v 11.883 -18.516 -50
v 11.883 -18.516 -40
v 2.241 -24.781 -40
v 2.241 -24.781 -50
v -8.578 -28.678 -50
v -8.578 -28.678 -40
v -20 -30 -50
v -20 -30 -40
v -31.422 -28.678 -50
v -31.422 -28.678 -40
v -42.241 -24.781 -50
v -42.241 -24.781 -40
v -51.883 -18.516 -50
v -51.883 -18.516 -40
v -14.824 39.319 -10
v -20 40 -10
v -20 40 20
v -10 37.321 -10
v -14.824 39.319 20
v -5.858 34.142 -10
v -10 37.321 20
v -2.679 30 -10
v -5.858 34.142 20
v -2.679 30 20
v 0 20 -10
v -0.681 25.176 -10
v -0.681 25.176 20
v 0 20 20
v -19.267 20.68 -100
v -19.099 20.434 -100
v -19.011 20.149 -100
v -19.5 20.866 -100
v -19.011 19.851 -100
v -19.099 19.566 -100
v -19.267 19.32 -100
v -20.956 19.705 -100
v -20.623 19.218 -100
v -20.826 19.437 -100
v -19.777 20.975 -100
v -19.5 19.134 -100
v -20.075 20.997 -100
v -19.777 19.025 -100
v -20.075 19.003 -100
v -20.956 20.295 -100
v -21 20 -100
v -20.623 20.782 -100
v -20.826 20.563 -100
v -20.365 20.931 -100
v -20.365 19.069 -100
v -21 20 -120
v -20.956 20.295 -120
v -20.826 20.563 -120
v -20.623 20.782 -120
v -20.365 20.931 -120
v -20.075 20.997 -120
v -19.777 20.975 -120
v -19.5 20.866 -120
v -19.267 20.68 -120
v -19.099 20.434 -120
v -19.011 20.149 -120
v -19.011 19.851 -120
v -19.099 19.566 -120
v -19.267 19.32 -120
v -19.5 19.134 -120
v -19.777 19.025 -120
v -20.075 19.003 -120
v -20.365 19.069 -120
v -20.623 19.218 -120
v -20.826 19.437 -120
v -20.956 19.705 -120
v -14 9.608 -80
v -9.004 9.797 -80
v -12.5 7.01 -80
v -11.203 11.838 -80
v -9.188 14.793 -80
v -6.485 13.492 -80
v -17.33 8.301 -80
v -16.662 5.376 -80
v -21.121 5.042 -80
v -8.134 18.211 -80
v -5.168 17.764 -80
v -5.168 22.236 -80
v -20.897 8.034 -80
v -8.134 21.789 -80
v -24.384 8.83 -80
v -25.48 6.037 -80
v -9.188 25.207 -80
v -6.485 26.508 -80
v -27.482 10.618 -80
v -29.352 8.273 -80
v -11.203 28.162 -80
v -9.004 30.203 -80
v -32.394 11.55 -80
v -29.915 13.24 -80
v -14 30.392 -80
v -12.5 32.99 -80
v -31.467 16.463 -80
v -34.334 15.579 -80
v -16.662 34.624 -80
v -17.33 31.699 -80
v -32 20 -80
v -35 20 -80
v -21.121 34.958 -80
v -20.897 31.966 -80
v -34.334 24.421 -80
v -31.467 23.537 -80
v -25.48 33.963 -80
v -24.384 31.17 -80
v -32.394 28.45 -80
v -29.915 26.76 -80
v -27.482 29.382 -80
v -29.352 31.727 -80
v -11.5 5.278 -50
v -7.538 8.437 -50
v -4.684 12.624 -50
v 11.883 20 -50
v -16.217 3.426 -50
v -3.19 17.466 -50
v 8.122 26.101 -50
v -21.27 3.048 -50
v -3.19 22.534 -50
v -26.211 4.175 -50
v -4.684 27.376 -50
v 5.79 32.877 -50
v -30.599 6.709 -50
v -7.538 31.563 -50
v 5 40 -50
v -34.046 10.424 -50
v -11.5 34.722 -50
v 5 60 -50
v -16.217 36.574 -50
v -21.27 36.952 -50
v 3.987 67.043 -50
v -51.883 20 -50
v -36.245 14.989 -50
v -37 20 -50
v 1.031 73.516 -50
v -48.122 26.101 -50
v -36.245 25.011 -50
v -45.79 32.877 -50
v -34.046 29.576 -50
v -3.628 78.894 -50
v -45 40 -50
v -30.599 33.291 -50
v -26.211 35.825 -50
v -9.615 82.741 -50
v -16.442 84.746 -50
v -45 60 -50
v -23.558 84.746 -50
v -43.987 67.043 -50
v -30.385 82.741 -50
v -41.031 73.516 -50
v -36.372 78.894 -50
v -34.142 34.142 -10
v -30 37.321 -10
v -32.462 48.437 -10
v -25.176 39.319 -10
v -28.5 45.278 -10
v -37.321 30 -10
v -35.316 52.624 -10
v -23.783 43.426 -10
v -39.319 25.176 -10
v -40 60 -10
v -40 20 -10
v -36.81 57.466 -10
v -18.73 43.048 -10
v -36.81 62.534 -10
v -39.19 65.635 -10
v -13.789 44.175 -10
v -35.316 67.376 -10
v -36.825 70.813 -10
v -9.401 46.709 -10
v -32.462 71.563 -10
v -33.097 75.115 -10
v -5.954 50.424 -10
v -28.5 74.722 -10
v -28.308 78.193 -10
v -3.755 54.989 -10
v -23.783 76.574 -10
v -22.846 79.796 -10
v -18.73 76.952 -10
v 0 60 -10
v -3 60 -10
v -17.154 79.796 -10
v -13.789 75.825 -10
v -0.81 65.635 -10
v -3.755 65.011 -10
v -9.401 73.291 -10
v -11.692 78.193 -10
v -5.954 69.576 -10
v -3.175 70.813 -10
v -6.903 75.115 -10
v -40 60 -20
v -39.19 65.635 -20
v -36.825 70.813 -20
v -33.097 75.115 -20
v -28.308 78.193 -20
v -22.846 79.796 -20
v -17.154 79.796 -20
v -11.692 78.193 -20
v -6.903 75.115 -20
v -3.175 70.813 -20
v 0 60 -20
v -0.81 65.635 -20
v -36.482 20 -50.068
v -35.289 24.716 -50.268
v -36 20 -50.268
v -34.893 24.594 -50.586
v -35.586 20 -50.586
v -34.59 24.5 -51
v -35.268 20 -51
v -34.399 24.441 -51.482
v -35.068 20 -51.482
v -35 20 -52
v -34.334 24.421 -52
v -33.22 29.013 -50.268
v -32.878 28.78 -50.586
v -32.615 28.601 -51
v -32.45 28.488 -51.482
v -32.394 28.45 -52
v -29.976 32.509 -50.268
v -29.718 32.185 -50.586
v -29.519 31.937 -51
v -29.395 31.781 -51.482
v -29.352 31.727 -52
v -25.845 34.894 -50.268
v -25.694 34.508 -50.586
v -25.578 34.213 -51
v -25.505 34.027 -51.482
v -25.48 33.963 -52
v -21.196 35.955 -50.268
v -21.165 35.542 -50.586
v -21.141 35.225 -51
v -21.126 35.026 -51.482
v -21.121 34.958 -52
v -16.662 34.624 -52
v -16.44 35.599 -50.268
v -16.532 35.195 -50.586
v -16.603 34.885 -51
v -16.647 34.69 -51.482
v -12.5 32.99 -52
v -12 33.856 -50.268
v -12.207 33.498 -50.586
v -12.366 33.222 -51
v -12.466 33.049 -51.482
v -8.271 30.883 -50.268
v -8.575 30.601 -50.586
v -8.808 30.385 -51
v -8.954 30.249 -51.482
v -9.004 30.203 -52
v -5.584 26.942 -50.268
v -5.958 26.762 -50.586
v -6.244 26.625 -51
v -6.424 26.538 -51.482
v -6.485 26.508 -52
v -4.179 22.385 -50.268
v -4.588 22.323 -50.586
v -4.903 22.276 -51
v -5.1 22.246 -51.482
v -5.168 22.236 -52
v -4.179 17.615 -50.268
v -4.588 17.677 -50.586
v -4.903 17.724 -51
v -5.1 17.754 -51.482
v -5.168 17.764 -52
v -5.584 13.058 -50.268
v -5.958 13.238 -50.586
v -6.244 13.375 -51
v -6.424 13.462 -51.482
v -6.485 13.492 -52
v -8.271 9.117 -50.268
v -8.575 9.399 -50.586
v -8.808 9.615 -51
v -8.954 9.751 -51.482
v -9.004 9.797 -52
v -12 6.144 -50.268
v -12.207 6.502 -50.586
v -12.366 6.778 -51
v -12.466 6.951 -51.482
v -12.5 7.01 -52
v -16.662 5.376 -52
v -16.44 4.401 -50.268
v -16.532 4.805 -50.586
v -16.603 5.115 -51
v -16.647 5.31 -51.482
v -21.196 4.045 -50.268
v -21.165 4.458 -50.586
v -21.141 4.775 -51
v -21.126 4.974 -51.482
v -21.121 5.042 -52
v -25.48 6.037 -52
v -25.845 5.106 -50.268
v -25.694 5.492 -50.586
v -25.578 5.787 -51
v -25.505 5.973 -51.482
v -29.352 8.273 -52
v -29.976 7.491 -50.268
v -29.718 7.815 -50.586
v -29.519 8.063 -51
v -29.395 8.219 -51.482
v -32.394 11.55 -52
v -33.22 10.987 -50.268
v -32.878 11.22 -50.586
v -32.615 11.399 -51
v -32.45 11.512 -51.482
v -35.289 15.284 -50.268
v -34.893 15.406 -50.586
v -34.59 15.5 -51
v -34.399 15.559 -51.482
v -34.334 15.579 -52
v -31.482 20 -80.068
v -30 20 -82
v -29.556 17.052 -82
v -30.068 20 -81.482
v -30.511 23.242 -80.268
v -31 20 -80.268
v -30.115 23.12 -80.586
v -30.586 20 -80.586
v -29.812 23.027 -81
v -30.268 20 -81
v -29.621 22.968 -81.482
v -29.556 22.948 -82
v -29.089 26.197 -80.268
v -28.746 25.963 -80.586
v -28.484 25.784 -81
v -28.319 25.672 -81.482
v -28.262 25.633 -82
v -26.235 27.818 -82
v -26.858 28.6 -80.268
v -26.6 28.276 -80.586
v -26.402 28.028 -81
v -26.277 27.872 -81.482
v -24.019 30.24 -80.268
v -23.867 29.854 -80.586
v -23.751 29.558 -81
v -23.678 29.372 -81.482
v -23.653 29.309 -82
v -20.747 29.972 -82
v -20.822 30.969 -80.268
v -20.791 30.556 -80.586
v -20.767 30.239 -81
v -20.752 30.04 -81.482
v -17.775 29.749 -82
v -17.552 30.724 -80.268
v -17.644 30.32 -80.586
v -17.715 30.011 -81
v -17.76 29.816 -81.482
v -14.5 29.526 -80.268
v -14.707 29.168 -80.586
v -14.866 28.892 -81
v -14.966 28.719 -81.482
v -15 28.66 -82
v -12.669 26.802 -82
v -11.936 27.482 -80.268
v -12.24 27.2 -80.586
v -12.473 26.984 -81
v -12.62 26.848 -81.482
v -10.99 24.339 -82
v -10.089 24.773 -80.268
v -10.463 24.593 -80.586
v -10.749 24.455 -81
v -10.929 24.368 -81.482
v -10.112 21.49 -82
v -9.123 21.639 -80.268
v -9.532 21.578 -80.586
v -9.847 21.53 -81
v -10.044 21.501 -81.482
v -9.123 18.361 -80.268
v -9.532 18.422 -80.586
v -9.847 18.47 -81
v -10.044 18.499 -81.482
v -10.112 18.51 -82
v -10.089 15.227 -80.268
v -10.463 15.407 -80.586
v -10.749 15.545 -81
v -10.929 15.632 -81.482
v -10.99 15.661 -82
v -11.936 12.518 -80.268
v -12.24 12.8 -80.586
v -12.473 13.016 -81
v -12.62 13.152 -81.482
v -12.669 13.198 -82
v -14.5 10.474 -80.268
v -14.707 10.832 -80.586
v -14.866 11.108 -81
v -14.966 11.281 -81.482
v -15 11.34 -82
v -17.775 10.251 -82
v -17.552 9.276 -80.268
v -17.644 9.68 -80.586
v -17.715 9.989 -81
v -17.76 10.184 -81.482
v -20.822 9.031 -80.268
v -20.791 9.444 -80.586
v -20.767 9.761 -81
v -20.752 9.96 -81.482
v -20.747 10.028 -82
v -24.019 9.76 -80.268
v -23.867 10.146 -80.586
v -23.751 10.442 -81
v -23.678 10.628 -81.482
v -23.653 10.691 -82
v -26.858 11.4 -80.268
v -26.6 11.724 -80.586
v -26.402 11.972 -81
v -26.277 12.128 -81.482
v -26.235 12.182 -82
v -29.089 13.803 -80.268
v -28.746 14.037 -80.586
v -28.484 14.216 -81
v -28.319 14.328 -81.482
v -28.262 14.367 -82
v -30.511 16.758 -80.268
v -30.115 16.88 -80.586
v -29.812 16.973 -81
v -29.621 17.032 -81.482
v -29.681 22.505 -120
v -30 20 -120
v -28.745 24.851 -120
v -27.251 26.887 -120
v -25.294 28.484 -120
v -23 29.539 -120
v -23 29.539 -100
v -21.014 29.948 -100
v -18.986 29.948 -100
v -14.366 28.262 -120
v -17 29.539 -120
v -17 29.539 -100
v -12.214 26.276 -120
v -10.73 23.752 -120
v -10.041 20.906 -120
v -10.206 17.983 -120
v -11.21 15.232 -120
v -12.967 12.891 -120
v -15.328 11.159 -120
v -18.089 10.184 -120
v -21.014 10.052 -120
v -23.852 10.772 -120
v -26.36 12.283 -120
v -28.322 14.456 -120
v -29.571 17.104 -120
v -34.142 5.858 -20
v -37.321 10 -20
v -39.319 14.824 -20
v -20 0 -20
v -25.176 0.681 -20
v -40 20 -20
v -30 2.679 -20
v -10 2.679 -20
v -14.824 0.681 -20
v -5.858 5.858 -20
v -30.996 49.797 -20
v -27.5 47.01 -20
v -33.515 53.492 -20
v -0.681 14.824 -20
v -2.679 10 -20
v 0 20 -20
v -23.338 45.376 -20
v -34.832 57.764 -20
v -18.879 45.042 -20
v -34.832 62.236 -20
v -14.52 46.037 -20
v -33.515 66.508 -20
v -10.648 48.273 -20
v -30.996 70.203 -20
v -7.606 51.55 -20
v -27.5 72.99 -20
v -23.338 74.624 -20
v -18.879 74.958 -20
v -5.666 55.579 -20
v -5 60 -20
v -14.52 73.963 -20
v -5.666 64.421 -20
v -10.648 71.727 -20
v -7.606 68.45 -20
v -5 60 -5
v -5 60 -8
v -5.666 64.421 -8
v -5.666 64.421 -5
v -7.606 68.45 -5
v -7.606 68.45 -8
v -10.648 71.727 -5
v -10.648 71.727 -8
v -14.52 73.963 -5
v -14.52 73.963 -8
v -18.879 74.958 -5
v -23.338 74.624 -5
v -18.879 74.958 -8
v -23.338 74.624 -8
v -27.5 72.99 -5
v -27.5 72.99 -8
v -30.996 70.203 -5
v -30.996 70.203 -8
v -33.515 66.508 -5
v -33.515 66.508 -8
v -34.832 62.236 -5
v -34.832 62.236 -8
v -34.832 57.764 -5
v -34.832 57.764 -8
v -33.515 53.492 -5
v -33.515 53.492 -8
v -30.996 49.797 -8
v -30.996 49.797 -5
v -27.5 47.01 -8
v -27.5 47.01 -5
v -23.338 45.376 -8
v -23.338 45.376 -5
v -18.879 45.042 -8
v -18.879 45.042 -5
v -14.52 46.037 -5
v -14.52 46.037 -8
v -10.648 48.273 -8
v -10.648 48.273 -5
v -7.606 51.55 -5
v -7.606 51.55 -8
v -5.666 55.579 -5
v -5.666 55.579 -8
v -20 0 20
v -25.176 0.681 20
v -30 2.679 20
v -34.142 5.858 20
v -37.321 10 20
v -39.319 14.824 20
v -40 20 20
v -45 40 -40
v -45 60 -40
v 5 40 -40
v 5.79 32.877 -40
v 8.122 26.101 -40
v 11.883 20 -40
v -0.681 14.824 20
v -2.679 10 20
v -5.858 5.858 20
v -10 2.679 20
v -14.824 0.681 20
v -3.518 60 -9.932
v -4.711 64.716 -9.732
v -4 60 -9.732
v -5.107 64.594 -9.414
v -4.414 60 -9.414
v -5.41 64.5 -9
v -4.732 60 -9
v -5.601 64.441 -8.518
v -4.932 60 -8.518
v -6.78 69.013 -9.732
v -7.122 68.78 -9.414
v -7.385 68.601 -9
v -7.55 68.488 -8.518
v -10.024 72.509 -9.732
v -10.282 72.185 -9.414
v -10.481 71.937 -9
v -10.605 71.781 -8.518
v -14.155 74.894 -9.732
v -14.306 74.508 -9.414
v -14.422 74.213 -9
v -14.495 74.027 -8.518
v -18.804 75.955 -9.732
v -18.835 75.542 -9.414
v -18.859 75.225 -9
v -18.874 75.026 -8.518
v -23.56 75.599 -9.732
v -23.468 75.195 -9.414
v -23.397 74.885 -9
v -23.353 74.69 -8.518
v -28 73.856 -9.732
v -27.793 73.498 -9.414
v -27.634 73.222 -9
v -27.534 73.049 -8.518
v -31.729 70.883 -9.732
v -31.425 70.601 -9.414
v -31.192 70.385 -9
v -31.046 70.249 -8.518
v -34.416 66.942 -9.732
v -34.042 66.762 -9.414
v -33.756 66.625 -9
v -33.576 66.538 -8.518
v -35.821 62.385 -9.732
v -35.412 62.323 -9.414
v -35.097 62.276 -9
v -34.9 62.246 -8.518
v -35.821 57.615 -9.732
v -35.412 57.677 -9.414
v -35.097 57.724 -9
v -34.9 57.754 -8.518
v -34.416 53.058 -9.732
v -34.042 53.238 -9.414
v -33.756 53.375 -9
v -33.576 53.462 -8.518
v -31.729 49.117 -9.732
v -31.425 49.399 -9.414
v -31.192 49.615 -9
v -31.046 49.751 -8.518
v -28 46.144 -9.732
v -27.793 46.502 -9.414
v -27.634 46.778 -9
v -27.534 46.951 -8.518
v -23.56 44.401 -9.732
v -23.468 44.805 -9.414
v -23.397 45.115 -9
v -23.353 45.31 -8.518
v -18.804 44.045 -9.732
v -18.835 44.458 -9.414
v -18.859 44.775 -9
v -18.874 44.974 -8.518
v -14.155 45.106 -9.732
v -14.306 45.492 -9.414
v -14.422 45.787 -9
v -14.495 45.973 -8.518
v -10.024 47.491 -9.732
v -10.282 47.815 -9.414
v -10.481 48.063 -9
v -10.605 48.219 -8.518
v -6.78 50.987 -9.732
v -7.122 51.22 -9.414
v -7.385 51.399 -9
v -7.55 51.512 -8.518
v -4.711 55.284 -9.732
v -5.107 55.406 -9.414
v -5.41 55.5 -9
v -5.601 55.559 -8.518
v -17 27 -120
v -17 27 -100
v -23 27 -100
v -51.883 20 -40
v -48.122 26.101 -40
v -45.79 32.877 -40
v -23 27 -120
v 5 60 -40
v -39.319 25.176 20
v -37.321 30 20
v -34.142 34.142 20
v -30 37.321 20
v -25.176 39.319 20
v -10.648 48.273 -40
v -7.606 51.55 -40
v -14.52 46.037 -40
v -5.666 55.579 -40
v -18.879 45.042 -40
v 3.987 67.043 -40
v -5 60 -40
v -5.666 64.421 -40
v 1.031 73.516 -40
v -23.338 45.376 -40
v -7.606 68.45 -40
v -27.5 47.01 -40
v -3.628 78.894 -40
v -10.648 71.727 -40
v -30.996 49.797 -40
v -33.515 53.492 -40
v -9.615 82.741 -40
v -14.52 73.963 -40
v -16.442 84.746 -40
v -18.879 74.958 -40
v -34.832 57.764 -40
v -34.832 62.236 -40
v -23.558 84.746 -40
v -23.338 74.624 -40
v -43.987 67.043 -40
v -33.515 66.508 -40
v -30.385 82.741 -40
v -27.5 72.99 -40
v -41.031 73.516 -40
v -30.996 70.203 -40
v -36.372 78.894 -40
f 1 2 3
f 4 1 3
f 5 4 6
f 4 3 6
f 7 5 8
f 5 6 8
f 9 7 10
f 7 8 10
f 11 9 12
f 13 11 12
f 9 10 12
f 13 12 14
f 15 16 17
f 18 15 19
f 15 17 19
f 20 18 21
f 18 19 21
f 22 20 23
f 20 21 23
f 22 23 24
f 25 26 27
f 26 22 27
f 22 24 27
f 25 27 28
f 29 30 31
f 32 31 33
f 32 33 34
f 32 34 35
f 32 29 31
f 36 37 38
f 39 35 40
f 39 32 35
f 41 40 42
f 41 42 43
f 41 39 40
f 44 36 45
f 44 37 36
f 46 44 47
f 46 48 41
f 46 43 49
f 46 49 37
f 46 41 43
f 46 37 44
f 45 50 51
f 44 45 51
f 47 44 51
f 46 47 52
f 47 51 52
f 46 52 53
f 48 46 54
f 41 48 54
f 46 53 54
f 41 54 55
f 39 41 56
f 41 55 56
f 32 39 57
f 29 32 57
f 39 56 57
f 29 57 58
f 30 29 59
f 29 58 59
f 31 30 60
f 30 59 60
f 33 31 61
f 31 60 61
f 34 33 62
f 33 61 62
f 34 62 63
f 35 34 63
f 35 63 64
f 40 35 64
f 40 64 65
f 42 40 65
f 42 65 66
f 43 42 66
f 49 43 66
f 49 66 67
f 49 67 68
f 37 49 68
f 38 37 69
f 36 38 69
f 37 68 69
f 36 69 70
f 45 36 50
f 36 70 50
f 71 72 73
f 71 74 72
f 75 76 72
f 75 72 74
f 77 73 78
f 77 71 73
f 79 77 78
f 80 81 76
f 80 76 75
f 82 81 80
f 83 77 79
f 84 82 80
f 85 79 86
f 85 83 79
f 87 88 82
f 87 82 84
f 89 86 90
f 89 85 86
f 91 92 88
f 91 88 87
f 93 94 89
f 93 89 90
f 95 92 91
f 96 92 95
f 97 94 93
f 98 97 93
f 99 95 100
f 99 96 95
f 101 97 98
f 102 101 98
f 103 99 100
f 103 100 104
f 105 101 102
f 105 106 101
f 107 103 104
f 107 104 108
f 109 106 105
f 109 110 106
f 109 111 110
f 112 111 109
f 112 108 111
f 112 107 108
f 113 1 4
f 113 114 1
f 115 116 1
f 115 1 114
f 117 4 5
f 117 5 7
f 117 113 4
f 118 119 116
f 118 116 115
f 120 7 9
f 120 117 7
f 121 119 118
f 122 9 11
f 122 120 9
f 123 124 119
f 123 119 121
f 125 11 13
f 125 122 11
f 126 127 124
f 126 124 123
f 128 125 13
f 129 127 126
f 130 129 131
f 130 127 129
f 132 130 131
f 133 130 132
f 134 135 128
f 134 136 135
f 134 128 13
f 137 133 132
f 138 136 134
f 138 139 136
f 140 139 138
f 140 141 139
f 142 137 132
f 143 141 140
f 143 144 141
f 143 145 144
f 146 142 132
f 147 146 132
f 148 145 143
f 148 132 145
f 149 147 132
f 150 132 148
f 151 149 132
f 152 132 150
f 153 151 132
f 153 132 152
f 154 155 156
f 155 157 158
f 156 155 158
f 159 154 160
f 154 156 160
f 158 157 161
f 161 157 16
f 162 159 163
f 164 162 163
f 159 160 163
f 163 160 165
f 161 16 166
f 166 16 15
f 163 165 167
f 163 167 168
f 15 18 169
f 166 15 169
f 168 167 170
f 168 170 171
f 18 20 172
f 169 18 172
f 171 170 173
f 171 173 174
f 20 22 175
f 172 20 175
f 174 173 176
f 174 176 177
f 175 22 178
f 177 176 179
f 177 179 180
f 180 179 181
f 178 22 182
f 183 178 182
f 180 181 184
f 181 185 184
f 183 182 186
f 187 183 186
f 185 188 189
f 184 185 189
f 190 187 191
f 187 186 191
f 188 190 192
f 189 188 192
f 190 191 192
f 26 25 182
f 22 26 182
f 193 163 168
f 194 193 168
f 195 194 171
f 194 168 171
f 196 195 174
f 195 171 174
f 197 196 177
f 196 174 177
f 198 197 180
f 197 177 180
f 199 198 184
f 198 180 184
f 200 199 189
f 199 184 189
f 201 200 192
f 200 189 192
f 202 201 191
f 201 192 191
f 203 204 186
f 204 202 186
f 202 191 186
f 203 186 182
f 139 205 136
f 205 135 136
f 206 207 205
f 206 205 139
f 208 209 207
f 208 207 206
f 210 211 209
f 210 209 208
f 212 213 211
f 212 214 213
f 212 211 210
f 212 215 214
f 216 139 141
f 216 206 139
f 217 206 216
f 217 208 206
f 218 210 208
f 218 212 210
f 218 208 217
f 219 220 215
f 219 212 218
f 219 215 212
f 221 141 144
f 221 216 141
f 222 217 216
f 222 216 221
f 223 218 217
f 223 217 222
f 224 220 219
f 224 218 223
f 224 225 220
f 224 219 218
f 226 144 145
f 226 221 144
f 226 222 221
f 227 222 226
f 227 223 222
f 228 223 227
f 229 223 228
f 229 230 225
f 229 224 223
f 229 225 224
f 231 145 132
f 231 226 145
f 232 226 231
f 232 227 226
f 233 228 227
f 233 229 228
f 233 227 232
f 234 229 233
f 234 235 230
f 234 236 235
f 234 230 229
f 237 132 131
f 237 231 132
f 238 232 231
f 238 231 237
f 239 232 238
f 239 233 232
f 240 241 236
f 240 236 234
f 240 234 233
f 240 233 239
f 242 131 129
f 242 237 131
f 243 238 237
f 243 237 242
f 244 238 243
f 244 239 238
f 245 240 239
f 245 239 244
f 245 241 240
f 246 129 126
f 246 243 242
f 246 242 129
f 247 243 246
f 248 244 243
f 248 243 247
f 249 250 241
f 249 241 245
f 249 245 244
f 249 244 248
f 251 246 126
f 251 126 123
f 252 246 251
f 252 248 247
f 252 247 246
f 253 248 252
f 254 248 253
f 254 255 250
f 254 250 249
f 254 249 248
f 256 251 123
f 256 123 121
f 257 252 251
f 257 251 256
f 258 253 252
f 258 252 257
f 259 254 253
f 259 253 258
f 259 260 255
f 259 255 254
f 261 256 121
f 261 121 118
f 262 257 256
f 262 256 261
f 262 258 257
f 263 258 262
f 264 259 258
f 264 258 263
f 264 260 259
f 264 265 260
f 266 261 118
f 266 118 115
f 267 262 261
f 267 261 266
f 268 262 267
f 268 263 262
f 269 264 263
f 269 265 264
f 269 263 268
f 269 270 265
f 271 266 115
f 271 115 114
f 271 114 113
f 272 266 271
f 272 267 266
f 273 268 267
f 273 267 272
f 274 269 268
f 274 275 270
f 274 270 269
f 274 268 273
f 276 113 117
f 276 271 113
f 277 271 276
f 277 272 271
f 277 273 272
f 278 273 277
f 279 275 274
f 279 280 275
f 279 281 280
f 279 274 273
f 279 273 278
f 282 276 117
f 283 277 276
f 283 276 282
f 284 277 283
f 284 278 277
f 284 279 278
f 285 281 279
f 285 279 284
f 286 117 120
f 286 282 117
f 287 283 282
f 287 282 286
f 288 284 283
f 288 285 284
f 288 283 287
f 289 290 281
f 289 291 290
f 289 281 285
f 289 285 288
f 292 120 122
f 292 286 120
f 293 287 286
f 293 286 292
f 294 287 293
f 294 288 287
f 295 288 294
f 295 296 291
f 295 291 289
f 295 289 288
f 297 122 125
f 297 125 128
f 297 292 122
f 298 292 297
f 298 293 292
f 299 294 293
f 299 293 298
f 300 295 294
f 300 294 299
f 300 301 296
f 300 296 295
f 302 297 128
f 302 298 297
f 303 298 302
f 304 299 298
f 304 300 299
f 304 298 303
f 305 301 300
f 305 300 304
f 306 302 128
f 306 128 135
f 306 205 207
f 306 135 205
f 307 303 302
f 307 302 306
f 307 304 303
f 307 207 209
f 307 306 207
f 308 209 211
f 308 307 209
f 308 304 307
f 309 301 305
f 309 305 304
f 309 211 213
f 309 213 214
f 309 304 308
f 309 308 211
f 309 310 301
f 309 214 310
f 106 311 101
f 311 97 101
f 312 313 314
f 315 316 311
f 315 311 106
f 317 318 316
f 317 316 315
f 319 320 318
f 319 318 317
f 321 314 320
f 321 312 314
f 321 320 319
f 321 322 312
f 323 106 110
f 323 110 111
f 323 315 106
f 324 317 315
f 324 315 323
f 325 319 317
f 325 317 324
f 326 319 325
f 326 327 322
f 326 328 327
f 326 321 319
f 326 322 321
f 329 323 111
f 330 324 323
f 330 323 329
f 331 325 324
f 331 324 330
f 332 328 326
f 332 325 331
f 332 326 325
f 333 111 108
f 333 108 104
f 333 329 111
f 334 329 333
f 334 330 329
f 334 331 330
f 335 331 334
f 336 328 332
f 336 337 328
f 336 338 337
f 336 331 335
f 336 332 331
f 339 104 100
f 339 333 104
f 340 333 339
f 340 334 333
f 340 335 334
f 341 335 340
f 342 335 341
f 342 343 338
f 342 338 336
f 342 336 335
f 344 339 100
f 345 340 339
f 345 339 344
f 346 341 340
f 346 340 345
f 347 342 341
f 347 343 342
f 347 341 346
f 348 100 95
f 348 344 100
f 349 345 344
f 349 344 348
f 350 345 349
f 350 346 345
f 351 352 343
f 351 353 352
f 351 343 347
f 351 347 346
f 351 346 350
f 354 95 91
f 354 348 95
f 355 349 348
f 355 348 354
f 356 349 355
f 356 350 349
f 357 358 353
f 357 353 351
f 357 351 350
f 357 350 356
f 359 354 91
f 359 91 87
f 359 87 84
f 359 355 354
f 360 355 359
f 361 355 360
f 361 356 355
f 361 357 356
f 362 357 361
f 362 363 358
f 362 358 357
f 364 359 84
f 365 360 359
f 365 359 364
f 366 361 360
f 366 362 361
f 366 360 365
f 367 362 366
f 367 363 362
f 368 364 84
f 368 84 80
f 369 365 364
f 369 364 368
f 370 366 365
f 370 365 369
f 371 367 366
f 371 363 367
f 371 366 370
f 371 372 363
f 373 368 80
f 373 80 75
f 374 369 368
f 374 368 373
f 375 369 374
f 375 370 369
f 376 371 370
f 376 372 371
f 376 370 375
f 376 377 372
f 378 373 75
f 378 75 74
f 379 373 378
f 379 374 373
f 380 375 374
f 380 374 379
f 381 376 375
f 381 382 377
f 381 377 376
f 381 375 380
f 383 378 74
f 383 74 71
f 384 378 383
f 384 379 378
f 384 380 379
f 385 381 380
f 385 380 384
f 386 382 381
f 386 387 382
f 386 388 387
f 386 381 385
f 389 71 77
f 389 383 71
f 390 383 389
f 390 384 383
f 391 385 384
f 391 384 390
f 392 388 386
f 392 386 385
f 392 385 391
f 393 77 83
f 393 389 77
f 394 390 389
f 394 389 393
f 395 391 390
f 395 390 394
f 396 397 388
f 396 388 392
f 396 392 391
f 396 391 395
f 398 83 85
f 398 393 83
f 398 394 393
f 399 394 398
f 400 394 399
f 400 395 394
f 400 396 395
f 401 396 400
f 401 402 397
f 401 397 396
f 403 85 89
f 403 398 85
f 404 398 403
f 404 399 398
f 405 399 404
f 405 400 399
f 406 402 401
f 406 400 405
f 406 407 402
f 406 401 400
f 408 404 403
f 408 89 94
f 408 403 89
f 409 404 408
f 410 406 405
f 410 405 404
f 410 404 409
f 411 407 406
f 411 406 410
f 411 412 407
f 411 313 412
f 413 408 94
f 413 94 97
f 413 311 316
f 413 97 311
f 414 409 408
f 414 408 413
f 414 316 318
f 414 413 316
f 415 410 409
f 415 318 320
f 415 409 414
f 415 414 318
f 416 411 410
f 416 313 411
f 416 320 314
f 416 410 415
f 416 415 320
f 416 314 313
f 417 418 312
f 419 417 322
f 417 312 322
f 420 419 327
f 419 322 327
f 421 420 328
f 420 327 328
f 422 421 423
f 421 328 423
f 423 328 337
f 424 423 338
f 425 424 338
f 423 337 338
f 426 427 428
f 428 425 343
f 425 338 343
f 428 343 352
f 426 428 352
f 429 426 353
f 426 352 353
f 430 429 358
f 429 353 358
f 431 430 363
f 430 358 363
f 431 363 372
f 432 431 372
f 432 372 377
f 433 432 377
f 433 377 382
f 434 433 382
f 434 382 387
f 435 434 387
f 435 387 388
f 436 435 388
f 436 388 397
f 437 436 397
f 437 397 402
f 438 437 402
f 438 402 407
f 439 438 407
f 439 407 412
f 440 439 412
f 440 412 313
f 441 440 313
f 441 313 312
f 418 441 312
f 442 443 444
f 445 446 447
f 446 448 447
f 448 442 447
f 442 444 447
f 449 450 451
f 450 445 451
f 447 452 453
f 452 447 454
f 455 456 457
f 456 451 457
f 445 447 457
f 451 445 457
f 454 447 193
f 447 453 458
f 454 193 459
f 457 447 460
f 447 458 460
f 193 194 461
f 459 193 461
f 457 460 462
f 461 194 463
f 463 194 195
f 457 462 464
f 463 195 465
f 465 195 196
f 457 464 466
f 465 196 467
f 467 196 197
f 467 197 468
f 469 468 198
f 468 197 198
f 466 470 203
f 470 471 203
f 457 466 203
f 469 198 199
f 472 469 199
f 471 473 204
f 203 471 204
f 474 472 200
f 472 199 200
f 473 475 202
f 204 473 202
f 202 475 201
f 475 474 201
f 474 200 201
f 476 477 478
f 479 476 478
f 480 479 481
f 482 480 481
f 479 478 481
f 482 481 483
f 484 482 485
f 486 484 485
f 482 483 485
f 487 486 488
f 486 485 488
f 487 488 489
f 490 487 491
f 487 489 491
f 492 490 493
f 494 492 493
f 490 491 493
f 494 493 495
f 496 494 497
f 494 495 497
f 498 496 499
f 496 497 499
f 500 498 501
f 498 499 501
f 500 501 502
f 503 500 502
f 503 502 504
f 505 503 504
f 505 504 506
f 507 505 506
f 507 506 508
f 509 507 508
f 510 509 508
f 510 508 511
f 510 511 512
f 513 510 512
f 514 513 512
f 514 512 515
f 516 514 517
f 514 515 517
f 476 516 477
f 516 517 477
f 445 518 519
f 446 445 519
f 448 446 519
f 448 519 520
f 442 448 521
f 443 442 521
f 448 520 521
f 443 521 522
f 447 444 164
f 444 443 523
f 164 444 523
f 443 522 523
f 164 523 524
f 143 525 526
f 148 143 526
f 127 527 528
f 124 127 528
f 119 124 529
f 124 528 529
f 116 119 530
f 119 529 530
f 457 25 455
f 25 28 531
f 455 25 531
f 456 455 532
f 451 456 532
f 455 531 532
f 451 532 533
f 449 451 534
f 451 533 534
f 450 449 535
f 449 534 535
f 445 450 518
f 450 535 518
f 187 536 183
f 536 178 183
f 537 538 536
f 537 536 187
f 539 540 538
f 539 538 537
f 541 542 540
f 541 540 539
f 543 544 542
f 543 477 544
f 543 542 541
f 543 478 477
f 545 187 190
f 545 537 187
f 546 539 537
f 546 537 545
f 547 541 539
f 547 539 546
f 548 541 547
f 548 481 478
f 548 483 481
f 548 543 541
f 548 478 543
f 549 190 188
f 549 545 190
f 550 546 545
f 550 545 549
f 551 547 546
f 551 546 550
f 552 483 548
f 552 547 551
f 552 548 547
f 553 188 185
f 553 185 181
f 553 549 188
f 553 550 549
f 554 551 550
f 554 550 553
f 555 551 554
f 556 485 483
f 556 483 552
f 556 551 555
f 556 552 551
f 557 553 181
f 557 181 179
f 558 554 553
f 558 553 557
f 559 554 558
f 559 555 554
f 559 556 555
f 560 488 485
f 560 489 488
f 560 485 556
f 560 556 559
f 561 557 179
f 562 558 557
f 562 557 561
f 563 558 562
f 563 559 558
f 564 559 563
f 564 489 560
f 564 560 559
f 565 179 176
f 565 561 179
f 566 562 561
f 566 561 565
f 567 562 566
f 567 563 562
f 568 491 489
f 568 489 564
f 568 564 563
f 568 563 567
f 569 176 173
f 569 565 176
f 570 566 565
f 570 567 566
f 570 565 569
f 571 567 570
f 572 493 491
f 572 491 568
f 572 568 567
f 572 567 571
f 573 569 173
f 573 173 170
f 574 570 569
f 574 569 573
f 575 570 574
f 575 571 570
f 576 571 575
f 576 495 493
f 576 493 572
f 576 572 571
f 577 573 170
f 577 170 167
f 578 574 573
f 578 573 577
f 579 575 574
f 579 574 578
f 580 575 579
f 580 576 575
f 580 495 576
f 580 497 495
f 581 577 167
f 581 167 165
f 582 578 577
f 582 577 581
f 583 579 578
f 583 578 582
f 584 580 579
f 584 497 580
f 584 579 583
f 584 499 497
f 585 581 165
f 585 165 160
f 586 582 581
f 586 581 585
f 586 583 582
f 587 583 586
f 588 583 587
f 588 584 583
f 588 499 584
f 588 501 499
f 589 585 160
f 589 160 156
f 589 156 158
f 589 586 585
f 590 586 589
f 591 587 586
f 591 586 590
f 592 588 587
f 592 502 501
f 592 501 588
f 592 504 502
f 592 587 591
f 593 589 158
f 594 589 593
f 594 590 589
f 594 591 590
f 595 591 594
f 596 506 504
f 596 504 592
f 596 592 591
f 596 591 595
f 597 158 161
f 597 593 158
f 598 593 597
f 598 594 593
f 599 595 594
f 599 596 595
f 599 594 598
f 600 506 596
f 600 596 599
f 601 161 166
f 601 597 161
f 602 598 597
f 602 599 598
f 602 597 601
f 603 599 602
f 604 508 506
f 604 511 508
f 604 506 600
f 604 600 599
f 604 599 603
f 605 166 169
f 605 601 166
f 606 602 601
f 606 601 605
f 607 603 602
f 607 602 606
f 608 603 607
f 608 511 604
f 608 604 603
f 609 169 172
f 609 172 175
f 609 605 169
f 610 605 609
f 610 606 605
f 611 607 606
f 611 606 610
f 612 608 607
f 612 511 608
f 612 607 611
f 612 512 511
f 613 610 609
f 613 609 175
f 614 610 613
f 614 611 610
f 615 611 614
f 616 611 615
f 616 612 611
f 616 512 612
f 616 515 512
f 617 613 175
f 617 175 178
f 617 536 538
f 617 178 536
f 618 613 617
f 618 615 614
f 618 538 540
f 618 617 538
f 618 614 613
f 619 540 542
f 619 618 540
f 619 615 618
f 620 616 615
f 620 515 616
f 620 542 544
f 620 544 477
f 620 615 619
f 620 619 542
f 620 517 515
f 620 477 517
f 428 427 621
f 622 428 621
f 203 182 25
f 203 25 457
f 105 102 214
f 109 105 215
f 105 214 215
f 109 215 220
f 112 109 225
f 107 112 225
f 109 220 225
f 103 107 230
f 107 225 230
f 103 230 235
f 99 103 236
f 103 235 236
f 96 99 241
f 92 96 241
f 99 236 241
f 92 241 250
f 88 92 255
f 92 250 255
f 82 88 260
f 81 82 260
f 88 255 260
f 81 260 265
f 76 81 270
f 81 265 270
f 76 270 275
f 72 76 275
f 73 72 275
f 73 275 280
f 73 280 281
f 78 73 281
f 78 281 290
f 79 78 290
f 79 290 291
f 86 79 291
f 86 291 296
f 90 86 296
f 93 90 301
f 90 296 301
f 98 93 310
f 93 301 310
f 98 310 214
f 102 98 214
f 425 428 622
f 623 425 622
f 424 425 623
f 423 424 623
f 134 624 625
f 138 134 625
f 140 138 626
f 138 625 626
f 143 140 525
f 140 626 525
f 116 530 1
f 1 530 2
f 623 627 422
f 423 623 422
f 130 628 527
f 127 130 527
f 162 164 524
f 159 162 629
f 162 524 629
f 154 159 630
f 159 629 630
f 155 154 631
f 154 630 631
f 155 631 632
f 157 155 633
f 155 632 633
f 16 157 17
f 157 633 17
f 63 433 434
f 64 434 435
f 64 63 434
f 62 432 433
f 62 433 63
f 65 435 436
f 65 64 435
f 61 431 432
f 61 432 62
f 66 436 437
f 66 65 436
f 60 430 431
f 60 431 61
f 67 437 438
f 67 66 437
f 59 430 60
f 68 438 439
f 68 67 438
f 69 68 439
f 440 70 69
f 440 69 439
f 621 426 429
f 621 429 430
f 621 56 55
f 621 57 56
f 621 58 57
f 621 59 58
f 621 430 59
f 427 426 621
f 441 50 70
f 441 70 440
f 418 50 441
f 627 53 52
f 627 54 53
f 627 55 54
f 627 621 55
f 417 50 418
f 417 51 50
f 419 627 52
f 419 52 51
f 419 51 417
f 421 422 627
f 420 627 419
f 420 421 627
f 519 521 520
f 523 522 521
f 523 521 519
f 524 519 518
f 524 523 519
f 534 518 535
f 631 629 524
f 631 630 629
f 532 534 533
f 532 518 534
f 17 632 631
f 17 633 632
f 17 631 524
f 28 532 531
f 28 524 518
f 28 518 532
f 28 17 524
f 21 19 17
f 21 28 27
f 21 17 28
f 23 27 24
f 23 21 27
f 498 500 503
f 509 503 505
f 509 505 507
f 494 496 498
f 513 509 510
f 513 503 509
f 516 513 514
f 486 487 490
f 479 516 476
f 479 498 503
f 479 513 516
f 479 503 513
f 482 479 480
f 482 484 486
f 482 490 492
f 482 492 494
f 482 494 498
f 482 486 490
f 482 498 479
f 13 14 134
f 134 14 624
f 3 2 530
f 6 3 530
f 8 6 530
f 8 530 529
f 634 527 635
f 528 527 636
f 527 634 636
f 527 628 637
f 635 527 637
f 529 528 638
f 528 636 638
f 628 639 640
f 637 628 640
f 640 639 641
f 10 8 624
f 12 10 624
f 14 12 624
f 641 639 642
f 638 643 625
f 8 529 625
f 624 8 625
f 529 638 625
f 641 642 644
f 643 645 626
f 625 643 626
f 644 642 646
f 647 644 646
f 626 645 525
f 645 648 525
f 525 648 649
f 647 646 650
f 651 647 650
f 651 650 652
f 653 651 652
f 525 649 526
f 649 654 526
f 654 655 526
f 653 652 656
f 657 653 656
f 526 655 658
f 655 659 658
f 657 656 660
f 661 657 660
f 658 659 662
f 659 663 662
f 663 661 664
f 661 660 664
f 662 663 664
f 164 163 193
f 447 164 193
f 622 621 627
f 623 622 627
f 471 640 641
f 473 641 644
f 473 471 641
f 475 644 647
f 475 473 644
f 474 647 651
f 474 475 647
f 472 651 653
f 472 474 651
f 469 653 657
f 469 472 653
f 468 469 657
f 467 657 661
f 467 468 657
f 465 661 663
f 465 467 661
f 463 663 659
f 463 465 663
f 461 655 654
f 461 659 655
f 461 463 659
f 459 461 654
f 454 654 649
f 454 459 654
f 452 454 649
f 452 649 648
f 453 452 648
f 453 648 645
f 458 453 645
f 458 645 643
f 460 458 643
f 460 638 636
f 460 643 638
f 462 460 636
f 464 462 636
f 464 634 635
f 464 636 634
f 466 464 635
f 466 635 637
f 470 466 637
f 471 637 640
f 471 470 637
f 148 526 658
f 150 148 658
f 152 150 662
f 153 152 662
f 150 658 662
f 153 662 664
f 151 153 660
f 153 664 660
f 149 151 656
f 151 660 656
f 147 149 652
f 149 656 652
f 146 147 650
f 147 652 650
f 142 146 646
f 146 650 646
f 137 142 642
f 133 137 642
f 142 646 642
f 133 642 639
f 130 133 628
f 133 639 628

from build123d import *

# Parameters (mm, degrees)
IZIM1_W                          = 40
IZIM1_H                          = 40
Y_KSEKLIK_EKSTR_ZYON1_DEPTH      = 20
KES_EKSTR_ZYON1_DEPTH            = 40
IZIM4_W                          = 10
IZIM4_H                          = 65
Y_KSEKLIK_EKSTR_ZYON2_DEPTH      = 40
KES_EKSTR_ZYON2_DEPTH            = 40
Y_KSEKLIK_EKSTR_ZYON3_DEPTH      = 5
Y_KSEKLIK_EKSTR_ZYON3_DEPTH_BACK = 30
IZIM8_R                          = 15
RADYUS1_R                        = 2
IZIM10_R                         = 15
Y_KSEKLIK_EKSTR_ZYON4_DEPTH      = 10
IZIM10_3_R                       = 15
Y_KSEKLIK_EKSTR_ZYON5_DEPTH      = 10
IZIM18_R                         = 15
Y_KSEKLIK_EKSTR_ZYON6_DEPTH      = 30
IZIM19_R                         = 10
Y_KSEKLIK_EKSTR_ZYON7_DEPTH      = 40
RADYUS2_R                        = 2
RADYUS3_R                        = 2
IZIM21_R                         = 1
KES_EKSTR_ZYON3_DEPTH            = 20
KES_EKSTR_ZYON4_START            = -20
KES_EKSTR_ZYON4_DEPTH            = 20


with BuildPart() as part:
    # Çizim1 → Yükseklik-Ekstrüzyon1 (new, symmetric)
    with BuildSketch(Plane.XY):
        with Locations((-20, 20)):
            Rectangle(IZIM1_W, IZIM1_H)
    extrude(amount=Y_KSEKLIK_EKSTR_ZYON1_DEPTH, both=True)

    # Çizim3 → Kes-Ekstrüzyon1 (cut)
    with BuildSketch(Plane.XY.offset(20)):
        with BuildLine():
            Line((-40, 20), (-40, 0))
            Line((-40, 0), (-20, 0))
            ThreePointArc((-20, 0), (-34.142135624, 5.857864376), (-40, 20))
        make_face()
        with BuildLine():
            ThreePointArc((0, 20), (-5.857864376, 5.857864376), (-20, 0))
            Line((-20, 0), (0, 0))
            Line((0, 0), (0, 20))
        make_face()
        with BuildLine():
            Line((-40, 40), (-40, 20))
            ThreePointArc((-40, 20), (-34.142135624, 34.142135624), (-20, 40))
            Line((-20, 40), (-40, 40))
        make_face()
        with BuildLine():
            ThreePointArc((-20, 40), (-5.857864376, 34.142135624), (0, 20))
            Line((0, 20), (0, 40))
            Line((0, 40), (-20, 40))
        make_face()
    extrude(amount=-KES_EKSTR_ZYON1_DEPTH, mode=Mode.SUBTRACT)

    # Çizim4 → Yükseklik-Ekstrüzyon2 (add)
    with BuildSketch(Plane(origin=(0, 0, 0), x_dir=(0, 0, -1), z_dir=(1, 0, 0))):
        with Locations((15, 52.5)):
            Rectangle(IZIM4_W, IZIM4_H)
    extrude(amount=-Y_KSEKLIK_EKSTR_ZYON2_DEPTH)

    # Çizim7 → Kes-Ekstrüzyon2 (cut)
    with BuildSketch(Plane.XY.offset(-10)):
        with BuildLine():
            Line((0, 60), (0, 85))
            Line((0, 85), (-40, 85))
            Line((-40, 85), (-40, 60))
            ThreePointArc((-40, 60), (-20, 80), (0, 60))
        make_face()
    extrude(amount=-KES_EKSTR_ZYON2_DEPTH, mode=Mode.SUBTRACT)

    # Çizim8 → Yükseklik-Ekstrüzyon3 (add, two sides: drawn at the far end of the back side and taken through both)
    with BuildSketch(Plane.XY.offset(-10).offset(-Y_KSEKLIK_EKSTR_ZYON3_DEPTH_BACK)):
        with Locations((-20, 60)):
            Circle(IZIM8_R)
    extrude(amount=Y_KSEKLIK_EKSTR_ZYON3_DEPTH + Y_KSEKLIK_EKSTR_ZYON3_DEPTH_BACK)

    # Radyus1
    radyus1_edges = [part.edges().sort_by_distance(p)[0] for p in [
        (-35, 60, -10),
    ]]
    fillet(radyus1_edges, radius=RADYUS1_R)



with BuildPart() as body_2:
    # Çizim10 → Yükseklik-Ekstrüzyon4 (new body)
    with BuildSketch(Plane(origin=(0, 0, -40), x_dir=(-1, 0, 0), z_dir=(0, 0, -1))):
        with BuildLine():
            ThreePointArc((45, 60), (20, 85), (-5, 60))
            Line((-5, 60), (-5, 40))
            ThreePointArc((-5, 40), (-6.768788262, 29.424432633), (-11.882623085, 20))
            Line((-11.882623085, 20), (-11.882623085, -18.516208863))
            ThreePointArc((-11.882623085, -18.516208863), (20, -30), (51.882623085, -18.516208863))
            Line((51.882623085, -18.516208863), (51.882623085, 20))
            ThreePointArc((51.882623085, 20), (46.768788262, 29.424432633), (45, 40))
            Line((45, 40), (45, 60))
        make_face()
        with Locations((20, 60)):
            Circle(IZIM10_R, mode=Mode.SUBTRACT)
    extrude(amount=Y_KSEKLIK_EKSTR_ZYON4_DEPTH)


with BuildPart() as part_1:
    add(part.part)

    add(body_2.part)  # Yükseklik-Ekstrüzyon5 merges body 2
    # Çizim10<3> → Yükseklik-Ekstrüzyon5 (add)
    with BuildSketch(Plane(origin=(0, 0, -40), x_dir=(-1, 0, 0), z_dir=(0, 0, -1))):
        with Locations((20, 60)):
            Circle(IZIM10_3_R)
    extrude(amount=Y_KSEKLIK_EKSTR_ZYON5_DEPTH)

    # Çizim18 → Yükseklik-Ekstrüzyon6 (add)
    with BuildSketch(Plane(origin=(0, 0, -50), x_dir=(-1, 0, 0), z_dir=(0, 0, -1))):
        with Locations((20, 20)):
            Circle(IZIM18_R)
    extrude(amount=Y_KSEKLIK_EKSTR_ZYON6_DEPTH)

    # Çizim19 → Yükseklik-Ekstrüzyon7 (add)
    with BuildSketch(Plane(origin=(0, 0, -80), x_dir=(-1, 0, 0), z_dir=(0, 0, -1))):
        with Locations((20, 20)):
            Circle(IZIM19_R)
    extrude(amount=Y_KSEKLIK_EKSTR_ZYON7_DEPTH)

    # Radyus2
    radyus2_edges = [part_1.edges().sort_by_distance(p)[0] for p in [
        (-5, 20, -50),
    ]]
    fillet(radyus2_edges, radius=RADYUS2_R)

    # Radyus3
    radyus3_edges = [part_1.edges().sort_by_distance(p)[0] for p in [
        (-10, 20, -80),
    ]]
    fillet(radyus3_edges, radius=RADYUS3_R)

    # Çizim21 → Kes-Ekstrüzyon3 (cut)
    with BuildSketch(Plane(origin=(0, 0, -120), x_dir=(-1, 0, 0), z_dir=(0, 0, -1))):
        with Locations((20, 20)):
            Circle(IZIM21_R)
    extrude(amount=-KES_EKSTR_ZYON3_DEPTH, mode=Mode.SUBTRACT)

    # Çizim22 → Kes-Ekstrüzyon4 (cut)
    with BuildSketch(Plane(origin=(0, 0, -120), x_dir=(-1, 0, 0), z_dir=(0, 0, -1)).offset(KES_EKSTR_ZYON4_START)):
        with BuildLine():
            Line((17, 27), (20, 27))
            Line((20, 27), (23, 27))
            Line((23, 27), (23, 29.539392014))
            ThreePointArc((23, 29.539392014), (20, 30), (17, 29.539392014))
            Line((17, 29.539392014), (17, 27))
        make_face()
    extrude(amount=KES_EKSTR_ZYON4_DEPTH, mode=Mode.SUBTRACT)


solid = part_1.part
